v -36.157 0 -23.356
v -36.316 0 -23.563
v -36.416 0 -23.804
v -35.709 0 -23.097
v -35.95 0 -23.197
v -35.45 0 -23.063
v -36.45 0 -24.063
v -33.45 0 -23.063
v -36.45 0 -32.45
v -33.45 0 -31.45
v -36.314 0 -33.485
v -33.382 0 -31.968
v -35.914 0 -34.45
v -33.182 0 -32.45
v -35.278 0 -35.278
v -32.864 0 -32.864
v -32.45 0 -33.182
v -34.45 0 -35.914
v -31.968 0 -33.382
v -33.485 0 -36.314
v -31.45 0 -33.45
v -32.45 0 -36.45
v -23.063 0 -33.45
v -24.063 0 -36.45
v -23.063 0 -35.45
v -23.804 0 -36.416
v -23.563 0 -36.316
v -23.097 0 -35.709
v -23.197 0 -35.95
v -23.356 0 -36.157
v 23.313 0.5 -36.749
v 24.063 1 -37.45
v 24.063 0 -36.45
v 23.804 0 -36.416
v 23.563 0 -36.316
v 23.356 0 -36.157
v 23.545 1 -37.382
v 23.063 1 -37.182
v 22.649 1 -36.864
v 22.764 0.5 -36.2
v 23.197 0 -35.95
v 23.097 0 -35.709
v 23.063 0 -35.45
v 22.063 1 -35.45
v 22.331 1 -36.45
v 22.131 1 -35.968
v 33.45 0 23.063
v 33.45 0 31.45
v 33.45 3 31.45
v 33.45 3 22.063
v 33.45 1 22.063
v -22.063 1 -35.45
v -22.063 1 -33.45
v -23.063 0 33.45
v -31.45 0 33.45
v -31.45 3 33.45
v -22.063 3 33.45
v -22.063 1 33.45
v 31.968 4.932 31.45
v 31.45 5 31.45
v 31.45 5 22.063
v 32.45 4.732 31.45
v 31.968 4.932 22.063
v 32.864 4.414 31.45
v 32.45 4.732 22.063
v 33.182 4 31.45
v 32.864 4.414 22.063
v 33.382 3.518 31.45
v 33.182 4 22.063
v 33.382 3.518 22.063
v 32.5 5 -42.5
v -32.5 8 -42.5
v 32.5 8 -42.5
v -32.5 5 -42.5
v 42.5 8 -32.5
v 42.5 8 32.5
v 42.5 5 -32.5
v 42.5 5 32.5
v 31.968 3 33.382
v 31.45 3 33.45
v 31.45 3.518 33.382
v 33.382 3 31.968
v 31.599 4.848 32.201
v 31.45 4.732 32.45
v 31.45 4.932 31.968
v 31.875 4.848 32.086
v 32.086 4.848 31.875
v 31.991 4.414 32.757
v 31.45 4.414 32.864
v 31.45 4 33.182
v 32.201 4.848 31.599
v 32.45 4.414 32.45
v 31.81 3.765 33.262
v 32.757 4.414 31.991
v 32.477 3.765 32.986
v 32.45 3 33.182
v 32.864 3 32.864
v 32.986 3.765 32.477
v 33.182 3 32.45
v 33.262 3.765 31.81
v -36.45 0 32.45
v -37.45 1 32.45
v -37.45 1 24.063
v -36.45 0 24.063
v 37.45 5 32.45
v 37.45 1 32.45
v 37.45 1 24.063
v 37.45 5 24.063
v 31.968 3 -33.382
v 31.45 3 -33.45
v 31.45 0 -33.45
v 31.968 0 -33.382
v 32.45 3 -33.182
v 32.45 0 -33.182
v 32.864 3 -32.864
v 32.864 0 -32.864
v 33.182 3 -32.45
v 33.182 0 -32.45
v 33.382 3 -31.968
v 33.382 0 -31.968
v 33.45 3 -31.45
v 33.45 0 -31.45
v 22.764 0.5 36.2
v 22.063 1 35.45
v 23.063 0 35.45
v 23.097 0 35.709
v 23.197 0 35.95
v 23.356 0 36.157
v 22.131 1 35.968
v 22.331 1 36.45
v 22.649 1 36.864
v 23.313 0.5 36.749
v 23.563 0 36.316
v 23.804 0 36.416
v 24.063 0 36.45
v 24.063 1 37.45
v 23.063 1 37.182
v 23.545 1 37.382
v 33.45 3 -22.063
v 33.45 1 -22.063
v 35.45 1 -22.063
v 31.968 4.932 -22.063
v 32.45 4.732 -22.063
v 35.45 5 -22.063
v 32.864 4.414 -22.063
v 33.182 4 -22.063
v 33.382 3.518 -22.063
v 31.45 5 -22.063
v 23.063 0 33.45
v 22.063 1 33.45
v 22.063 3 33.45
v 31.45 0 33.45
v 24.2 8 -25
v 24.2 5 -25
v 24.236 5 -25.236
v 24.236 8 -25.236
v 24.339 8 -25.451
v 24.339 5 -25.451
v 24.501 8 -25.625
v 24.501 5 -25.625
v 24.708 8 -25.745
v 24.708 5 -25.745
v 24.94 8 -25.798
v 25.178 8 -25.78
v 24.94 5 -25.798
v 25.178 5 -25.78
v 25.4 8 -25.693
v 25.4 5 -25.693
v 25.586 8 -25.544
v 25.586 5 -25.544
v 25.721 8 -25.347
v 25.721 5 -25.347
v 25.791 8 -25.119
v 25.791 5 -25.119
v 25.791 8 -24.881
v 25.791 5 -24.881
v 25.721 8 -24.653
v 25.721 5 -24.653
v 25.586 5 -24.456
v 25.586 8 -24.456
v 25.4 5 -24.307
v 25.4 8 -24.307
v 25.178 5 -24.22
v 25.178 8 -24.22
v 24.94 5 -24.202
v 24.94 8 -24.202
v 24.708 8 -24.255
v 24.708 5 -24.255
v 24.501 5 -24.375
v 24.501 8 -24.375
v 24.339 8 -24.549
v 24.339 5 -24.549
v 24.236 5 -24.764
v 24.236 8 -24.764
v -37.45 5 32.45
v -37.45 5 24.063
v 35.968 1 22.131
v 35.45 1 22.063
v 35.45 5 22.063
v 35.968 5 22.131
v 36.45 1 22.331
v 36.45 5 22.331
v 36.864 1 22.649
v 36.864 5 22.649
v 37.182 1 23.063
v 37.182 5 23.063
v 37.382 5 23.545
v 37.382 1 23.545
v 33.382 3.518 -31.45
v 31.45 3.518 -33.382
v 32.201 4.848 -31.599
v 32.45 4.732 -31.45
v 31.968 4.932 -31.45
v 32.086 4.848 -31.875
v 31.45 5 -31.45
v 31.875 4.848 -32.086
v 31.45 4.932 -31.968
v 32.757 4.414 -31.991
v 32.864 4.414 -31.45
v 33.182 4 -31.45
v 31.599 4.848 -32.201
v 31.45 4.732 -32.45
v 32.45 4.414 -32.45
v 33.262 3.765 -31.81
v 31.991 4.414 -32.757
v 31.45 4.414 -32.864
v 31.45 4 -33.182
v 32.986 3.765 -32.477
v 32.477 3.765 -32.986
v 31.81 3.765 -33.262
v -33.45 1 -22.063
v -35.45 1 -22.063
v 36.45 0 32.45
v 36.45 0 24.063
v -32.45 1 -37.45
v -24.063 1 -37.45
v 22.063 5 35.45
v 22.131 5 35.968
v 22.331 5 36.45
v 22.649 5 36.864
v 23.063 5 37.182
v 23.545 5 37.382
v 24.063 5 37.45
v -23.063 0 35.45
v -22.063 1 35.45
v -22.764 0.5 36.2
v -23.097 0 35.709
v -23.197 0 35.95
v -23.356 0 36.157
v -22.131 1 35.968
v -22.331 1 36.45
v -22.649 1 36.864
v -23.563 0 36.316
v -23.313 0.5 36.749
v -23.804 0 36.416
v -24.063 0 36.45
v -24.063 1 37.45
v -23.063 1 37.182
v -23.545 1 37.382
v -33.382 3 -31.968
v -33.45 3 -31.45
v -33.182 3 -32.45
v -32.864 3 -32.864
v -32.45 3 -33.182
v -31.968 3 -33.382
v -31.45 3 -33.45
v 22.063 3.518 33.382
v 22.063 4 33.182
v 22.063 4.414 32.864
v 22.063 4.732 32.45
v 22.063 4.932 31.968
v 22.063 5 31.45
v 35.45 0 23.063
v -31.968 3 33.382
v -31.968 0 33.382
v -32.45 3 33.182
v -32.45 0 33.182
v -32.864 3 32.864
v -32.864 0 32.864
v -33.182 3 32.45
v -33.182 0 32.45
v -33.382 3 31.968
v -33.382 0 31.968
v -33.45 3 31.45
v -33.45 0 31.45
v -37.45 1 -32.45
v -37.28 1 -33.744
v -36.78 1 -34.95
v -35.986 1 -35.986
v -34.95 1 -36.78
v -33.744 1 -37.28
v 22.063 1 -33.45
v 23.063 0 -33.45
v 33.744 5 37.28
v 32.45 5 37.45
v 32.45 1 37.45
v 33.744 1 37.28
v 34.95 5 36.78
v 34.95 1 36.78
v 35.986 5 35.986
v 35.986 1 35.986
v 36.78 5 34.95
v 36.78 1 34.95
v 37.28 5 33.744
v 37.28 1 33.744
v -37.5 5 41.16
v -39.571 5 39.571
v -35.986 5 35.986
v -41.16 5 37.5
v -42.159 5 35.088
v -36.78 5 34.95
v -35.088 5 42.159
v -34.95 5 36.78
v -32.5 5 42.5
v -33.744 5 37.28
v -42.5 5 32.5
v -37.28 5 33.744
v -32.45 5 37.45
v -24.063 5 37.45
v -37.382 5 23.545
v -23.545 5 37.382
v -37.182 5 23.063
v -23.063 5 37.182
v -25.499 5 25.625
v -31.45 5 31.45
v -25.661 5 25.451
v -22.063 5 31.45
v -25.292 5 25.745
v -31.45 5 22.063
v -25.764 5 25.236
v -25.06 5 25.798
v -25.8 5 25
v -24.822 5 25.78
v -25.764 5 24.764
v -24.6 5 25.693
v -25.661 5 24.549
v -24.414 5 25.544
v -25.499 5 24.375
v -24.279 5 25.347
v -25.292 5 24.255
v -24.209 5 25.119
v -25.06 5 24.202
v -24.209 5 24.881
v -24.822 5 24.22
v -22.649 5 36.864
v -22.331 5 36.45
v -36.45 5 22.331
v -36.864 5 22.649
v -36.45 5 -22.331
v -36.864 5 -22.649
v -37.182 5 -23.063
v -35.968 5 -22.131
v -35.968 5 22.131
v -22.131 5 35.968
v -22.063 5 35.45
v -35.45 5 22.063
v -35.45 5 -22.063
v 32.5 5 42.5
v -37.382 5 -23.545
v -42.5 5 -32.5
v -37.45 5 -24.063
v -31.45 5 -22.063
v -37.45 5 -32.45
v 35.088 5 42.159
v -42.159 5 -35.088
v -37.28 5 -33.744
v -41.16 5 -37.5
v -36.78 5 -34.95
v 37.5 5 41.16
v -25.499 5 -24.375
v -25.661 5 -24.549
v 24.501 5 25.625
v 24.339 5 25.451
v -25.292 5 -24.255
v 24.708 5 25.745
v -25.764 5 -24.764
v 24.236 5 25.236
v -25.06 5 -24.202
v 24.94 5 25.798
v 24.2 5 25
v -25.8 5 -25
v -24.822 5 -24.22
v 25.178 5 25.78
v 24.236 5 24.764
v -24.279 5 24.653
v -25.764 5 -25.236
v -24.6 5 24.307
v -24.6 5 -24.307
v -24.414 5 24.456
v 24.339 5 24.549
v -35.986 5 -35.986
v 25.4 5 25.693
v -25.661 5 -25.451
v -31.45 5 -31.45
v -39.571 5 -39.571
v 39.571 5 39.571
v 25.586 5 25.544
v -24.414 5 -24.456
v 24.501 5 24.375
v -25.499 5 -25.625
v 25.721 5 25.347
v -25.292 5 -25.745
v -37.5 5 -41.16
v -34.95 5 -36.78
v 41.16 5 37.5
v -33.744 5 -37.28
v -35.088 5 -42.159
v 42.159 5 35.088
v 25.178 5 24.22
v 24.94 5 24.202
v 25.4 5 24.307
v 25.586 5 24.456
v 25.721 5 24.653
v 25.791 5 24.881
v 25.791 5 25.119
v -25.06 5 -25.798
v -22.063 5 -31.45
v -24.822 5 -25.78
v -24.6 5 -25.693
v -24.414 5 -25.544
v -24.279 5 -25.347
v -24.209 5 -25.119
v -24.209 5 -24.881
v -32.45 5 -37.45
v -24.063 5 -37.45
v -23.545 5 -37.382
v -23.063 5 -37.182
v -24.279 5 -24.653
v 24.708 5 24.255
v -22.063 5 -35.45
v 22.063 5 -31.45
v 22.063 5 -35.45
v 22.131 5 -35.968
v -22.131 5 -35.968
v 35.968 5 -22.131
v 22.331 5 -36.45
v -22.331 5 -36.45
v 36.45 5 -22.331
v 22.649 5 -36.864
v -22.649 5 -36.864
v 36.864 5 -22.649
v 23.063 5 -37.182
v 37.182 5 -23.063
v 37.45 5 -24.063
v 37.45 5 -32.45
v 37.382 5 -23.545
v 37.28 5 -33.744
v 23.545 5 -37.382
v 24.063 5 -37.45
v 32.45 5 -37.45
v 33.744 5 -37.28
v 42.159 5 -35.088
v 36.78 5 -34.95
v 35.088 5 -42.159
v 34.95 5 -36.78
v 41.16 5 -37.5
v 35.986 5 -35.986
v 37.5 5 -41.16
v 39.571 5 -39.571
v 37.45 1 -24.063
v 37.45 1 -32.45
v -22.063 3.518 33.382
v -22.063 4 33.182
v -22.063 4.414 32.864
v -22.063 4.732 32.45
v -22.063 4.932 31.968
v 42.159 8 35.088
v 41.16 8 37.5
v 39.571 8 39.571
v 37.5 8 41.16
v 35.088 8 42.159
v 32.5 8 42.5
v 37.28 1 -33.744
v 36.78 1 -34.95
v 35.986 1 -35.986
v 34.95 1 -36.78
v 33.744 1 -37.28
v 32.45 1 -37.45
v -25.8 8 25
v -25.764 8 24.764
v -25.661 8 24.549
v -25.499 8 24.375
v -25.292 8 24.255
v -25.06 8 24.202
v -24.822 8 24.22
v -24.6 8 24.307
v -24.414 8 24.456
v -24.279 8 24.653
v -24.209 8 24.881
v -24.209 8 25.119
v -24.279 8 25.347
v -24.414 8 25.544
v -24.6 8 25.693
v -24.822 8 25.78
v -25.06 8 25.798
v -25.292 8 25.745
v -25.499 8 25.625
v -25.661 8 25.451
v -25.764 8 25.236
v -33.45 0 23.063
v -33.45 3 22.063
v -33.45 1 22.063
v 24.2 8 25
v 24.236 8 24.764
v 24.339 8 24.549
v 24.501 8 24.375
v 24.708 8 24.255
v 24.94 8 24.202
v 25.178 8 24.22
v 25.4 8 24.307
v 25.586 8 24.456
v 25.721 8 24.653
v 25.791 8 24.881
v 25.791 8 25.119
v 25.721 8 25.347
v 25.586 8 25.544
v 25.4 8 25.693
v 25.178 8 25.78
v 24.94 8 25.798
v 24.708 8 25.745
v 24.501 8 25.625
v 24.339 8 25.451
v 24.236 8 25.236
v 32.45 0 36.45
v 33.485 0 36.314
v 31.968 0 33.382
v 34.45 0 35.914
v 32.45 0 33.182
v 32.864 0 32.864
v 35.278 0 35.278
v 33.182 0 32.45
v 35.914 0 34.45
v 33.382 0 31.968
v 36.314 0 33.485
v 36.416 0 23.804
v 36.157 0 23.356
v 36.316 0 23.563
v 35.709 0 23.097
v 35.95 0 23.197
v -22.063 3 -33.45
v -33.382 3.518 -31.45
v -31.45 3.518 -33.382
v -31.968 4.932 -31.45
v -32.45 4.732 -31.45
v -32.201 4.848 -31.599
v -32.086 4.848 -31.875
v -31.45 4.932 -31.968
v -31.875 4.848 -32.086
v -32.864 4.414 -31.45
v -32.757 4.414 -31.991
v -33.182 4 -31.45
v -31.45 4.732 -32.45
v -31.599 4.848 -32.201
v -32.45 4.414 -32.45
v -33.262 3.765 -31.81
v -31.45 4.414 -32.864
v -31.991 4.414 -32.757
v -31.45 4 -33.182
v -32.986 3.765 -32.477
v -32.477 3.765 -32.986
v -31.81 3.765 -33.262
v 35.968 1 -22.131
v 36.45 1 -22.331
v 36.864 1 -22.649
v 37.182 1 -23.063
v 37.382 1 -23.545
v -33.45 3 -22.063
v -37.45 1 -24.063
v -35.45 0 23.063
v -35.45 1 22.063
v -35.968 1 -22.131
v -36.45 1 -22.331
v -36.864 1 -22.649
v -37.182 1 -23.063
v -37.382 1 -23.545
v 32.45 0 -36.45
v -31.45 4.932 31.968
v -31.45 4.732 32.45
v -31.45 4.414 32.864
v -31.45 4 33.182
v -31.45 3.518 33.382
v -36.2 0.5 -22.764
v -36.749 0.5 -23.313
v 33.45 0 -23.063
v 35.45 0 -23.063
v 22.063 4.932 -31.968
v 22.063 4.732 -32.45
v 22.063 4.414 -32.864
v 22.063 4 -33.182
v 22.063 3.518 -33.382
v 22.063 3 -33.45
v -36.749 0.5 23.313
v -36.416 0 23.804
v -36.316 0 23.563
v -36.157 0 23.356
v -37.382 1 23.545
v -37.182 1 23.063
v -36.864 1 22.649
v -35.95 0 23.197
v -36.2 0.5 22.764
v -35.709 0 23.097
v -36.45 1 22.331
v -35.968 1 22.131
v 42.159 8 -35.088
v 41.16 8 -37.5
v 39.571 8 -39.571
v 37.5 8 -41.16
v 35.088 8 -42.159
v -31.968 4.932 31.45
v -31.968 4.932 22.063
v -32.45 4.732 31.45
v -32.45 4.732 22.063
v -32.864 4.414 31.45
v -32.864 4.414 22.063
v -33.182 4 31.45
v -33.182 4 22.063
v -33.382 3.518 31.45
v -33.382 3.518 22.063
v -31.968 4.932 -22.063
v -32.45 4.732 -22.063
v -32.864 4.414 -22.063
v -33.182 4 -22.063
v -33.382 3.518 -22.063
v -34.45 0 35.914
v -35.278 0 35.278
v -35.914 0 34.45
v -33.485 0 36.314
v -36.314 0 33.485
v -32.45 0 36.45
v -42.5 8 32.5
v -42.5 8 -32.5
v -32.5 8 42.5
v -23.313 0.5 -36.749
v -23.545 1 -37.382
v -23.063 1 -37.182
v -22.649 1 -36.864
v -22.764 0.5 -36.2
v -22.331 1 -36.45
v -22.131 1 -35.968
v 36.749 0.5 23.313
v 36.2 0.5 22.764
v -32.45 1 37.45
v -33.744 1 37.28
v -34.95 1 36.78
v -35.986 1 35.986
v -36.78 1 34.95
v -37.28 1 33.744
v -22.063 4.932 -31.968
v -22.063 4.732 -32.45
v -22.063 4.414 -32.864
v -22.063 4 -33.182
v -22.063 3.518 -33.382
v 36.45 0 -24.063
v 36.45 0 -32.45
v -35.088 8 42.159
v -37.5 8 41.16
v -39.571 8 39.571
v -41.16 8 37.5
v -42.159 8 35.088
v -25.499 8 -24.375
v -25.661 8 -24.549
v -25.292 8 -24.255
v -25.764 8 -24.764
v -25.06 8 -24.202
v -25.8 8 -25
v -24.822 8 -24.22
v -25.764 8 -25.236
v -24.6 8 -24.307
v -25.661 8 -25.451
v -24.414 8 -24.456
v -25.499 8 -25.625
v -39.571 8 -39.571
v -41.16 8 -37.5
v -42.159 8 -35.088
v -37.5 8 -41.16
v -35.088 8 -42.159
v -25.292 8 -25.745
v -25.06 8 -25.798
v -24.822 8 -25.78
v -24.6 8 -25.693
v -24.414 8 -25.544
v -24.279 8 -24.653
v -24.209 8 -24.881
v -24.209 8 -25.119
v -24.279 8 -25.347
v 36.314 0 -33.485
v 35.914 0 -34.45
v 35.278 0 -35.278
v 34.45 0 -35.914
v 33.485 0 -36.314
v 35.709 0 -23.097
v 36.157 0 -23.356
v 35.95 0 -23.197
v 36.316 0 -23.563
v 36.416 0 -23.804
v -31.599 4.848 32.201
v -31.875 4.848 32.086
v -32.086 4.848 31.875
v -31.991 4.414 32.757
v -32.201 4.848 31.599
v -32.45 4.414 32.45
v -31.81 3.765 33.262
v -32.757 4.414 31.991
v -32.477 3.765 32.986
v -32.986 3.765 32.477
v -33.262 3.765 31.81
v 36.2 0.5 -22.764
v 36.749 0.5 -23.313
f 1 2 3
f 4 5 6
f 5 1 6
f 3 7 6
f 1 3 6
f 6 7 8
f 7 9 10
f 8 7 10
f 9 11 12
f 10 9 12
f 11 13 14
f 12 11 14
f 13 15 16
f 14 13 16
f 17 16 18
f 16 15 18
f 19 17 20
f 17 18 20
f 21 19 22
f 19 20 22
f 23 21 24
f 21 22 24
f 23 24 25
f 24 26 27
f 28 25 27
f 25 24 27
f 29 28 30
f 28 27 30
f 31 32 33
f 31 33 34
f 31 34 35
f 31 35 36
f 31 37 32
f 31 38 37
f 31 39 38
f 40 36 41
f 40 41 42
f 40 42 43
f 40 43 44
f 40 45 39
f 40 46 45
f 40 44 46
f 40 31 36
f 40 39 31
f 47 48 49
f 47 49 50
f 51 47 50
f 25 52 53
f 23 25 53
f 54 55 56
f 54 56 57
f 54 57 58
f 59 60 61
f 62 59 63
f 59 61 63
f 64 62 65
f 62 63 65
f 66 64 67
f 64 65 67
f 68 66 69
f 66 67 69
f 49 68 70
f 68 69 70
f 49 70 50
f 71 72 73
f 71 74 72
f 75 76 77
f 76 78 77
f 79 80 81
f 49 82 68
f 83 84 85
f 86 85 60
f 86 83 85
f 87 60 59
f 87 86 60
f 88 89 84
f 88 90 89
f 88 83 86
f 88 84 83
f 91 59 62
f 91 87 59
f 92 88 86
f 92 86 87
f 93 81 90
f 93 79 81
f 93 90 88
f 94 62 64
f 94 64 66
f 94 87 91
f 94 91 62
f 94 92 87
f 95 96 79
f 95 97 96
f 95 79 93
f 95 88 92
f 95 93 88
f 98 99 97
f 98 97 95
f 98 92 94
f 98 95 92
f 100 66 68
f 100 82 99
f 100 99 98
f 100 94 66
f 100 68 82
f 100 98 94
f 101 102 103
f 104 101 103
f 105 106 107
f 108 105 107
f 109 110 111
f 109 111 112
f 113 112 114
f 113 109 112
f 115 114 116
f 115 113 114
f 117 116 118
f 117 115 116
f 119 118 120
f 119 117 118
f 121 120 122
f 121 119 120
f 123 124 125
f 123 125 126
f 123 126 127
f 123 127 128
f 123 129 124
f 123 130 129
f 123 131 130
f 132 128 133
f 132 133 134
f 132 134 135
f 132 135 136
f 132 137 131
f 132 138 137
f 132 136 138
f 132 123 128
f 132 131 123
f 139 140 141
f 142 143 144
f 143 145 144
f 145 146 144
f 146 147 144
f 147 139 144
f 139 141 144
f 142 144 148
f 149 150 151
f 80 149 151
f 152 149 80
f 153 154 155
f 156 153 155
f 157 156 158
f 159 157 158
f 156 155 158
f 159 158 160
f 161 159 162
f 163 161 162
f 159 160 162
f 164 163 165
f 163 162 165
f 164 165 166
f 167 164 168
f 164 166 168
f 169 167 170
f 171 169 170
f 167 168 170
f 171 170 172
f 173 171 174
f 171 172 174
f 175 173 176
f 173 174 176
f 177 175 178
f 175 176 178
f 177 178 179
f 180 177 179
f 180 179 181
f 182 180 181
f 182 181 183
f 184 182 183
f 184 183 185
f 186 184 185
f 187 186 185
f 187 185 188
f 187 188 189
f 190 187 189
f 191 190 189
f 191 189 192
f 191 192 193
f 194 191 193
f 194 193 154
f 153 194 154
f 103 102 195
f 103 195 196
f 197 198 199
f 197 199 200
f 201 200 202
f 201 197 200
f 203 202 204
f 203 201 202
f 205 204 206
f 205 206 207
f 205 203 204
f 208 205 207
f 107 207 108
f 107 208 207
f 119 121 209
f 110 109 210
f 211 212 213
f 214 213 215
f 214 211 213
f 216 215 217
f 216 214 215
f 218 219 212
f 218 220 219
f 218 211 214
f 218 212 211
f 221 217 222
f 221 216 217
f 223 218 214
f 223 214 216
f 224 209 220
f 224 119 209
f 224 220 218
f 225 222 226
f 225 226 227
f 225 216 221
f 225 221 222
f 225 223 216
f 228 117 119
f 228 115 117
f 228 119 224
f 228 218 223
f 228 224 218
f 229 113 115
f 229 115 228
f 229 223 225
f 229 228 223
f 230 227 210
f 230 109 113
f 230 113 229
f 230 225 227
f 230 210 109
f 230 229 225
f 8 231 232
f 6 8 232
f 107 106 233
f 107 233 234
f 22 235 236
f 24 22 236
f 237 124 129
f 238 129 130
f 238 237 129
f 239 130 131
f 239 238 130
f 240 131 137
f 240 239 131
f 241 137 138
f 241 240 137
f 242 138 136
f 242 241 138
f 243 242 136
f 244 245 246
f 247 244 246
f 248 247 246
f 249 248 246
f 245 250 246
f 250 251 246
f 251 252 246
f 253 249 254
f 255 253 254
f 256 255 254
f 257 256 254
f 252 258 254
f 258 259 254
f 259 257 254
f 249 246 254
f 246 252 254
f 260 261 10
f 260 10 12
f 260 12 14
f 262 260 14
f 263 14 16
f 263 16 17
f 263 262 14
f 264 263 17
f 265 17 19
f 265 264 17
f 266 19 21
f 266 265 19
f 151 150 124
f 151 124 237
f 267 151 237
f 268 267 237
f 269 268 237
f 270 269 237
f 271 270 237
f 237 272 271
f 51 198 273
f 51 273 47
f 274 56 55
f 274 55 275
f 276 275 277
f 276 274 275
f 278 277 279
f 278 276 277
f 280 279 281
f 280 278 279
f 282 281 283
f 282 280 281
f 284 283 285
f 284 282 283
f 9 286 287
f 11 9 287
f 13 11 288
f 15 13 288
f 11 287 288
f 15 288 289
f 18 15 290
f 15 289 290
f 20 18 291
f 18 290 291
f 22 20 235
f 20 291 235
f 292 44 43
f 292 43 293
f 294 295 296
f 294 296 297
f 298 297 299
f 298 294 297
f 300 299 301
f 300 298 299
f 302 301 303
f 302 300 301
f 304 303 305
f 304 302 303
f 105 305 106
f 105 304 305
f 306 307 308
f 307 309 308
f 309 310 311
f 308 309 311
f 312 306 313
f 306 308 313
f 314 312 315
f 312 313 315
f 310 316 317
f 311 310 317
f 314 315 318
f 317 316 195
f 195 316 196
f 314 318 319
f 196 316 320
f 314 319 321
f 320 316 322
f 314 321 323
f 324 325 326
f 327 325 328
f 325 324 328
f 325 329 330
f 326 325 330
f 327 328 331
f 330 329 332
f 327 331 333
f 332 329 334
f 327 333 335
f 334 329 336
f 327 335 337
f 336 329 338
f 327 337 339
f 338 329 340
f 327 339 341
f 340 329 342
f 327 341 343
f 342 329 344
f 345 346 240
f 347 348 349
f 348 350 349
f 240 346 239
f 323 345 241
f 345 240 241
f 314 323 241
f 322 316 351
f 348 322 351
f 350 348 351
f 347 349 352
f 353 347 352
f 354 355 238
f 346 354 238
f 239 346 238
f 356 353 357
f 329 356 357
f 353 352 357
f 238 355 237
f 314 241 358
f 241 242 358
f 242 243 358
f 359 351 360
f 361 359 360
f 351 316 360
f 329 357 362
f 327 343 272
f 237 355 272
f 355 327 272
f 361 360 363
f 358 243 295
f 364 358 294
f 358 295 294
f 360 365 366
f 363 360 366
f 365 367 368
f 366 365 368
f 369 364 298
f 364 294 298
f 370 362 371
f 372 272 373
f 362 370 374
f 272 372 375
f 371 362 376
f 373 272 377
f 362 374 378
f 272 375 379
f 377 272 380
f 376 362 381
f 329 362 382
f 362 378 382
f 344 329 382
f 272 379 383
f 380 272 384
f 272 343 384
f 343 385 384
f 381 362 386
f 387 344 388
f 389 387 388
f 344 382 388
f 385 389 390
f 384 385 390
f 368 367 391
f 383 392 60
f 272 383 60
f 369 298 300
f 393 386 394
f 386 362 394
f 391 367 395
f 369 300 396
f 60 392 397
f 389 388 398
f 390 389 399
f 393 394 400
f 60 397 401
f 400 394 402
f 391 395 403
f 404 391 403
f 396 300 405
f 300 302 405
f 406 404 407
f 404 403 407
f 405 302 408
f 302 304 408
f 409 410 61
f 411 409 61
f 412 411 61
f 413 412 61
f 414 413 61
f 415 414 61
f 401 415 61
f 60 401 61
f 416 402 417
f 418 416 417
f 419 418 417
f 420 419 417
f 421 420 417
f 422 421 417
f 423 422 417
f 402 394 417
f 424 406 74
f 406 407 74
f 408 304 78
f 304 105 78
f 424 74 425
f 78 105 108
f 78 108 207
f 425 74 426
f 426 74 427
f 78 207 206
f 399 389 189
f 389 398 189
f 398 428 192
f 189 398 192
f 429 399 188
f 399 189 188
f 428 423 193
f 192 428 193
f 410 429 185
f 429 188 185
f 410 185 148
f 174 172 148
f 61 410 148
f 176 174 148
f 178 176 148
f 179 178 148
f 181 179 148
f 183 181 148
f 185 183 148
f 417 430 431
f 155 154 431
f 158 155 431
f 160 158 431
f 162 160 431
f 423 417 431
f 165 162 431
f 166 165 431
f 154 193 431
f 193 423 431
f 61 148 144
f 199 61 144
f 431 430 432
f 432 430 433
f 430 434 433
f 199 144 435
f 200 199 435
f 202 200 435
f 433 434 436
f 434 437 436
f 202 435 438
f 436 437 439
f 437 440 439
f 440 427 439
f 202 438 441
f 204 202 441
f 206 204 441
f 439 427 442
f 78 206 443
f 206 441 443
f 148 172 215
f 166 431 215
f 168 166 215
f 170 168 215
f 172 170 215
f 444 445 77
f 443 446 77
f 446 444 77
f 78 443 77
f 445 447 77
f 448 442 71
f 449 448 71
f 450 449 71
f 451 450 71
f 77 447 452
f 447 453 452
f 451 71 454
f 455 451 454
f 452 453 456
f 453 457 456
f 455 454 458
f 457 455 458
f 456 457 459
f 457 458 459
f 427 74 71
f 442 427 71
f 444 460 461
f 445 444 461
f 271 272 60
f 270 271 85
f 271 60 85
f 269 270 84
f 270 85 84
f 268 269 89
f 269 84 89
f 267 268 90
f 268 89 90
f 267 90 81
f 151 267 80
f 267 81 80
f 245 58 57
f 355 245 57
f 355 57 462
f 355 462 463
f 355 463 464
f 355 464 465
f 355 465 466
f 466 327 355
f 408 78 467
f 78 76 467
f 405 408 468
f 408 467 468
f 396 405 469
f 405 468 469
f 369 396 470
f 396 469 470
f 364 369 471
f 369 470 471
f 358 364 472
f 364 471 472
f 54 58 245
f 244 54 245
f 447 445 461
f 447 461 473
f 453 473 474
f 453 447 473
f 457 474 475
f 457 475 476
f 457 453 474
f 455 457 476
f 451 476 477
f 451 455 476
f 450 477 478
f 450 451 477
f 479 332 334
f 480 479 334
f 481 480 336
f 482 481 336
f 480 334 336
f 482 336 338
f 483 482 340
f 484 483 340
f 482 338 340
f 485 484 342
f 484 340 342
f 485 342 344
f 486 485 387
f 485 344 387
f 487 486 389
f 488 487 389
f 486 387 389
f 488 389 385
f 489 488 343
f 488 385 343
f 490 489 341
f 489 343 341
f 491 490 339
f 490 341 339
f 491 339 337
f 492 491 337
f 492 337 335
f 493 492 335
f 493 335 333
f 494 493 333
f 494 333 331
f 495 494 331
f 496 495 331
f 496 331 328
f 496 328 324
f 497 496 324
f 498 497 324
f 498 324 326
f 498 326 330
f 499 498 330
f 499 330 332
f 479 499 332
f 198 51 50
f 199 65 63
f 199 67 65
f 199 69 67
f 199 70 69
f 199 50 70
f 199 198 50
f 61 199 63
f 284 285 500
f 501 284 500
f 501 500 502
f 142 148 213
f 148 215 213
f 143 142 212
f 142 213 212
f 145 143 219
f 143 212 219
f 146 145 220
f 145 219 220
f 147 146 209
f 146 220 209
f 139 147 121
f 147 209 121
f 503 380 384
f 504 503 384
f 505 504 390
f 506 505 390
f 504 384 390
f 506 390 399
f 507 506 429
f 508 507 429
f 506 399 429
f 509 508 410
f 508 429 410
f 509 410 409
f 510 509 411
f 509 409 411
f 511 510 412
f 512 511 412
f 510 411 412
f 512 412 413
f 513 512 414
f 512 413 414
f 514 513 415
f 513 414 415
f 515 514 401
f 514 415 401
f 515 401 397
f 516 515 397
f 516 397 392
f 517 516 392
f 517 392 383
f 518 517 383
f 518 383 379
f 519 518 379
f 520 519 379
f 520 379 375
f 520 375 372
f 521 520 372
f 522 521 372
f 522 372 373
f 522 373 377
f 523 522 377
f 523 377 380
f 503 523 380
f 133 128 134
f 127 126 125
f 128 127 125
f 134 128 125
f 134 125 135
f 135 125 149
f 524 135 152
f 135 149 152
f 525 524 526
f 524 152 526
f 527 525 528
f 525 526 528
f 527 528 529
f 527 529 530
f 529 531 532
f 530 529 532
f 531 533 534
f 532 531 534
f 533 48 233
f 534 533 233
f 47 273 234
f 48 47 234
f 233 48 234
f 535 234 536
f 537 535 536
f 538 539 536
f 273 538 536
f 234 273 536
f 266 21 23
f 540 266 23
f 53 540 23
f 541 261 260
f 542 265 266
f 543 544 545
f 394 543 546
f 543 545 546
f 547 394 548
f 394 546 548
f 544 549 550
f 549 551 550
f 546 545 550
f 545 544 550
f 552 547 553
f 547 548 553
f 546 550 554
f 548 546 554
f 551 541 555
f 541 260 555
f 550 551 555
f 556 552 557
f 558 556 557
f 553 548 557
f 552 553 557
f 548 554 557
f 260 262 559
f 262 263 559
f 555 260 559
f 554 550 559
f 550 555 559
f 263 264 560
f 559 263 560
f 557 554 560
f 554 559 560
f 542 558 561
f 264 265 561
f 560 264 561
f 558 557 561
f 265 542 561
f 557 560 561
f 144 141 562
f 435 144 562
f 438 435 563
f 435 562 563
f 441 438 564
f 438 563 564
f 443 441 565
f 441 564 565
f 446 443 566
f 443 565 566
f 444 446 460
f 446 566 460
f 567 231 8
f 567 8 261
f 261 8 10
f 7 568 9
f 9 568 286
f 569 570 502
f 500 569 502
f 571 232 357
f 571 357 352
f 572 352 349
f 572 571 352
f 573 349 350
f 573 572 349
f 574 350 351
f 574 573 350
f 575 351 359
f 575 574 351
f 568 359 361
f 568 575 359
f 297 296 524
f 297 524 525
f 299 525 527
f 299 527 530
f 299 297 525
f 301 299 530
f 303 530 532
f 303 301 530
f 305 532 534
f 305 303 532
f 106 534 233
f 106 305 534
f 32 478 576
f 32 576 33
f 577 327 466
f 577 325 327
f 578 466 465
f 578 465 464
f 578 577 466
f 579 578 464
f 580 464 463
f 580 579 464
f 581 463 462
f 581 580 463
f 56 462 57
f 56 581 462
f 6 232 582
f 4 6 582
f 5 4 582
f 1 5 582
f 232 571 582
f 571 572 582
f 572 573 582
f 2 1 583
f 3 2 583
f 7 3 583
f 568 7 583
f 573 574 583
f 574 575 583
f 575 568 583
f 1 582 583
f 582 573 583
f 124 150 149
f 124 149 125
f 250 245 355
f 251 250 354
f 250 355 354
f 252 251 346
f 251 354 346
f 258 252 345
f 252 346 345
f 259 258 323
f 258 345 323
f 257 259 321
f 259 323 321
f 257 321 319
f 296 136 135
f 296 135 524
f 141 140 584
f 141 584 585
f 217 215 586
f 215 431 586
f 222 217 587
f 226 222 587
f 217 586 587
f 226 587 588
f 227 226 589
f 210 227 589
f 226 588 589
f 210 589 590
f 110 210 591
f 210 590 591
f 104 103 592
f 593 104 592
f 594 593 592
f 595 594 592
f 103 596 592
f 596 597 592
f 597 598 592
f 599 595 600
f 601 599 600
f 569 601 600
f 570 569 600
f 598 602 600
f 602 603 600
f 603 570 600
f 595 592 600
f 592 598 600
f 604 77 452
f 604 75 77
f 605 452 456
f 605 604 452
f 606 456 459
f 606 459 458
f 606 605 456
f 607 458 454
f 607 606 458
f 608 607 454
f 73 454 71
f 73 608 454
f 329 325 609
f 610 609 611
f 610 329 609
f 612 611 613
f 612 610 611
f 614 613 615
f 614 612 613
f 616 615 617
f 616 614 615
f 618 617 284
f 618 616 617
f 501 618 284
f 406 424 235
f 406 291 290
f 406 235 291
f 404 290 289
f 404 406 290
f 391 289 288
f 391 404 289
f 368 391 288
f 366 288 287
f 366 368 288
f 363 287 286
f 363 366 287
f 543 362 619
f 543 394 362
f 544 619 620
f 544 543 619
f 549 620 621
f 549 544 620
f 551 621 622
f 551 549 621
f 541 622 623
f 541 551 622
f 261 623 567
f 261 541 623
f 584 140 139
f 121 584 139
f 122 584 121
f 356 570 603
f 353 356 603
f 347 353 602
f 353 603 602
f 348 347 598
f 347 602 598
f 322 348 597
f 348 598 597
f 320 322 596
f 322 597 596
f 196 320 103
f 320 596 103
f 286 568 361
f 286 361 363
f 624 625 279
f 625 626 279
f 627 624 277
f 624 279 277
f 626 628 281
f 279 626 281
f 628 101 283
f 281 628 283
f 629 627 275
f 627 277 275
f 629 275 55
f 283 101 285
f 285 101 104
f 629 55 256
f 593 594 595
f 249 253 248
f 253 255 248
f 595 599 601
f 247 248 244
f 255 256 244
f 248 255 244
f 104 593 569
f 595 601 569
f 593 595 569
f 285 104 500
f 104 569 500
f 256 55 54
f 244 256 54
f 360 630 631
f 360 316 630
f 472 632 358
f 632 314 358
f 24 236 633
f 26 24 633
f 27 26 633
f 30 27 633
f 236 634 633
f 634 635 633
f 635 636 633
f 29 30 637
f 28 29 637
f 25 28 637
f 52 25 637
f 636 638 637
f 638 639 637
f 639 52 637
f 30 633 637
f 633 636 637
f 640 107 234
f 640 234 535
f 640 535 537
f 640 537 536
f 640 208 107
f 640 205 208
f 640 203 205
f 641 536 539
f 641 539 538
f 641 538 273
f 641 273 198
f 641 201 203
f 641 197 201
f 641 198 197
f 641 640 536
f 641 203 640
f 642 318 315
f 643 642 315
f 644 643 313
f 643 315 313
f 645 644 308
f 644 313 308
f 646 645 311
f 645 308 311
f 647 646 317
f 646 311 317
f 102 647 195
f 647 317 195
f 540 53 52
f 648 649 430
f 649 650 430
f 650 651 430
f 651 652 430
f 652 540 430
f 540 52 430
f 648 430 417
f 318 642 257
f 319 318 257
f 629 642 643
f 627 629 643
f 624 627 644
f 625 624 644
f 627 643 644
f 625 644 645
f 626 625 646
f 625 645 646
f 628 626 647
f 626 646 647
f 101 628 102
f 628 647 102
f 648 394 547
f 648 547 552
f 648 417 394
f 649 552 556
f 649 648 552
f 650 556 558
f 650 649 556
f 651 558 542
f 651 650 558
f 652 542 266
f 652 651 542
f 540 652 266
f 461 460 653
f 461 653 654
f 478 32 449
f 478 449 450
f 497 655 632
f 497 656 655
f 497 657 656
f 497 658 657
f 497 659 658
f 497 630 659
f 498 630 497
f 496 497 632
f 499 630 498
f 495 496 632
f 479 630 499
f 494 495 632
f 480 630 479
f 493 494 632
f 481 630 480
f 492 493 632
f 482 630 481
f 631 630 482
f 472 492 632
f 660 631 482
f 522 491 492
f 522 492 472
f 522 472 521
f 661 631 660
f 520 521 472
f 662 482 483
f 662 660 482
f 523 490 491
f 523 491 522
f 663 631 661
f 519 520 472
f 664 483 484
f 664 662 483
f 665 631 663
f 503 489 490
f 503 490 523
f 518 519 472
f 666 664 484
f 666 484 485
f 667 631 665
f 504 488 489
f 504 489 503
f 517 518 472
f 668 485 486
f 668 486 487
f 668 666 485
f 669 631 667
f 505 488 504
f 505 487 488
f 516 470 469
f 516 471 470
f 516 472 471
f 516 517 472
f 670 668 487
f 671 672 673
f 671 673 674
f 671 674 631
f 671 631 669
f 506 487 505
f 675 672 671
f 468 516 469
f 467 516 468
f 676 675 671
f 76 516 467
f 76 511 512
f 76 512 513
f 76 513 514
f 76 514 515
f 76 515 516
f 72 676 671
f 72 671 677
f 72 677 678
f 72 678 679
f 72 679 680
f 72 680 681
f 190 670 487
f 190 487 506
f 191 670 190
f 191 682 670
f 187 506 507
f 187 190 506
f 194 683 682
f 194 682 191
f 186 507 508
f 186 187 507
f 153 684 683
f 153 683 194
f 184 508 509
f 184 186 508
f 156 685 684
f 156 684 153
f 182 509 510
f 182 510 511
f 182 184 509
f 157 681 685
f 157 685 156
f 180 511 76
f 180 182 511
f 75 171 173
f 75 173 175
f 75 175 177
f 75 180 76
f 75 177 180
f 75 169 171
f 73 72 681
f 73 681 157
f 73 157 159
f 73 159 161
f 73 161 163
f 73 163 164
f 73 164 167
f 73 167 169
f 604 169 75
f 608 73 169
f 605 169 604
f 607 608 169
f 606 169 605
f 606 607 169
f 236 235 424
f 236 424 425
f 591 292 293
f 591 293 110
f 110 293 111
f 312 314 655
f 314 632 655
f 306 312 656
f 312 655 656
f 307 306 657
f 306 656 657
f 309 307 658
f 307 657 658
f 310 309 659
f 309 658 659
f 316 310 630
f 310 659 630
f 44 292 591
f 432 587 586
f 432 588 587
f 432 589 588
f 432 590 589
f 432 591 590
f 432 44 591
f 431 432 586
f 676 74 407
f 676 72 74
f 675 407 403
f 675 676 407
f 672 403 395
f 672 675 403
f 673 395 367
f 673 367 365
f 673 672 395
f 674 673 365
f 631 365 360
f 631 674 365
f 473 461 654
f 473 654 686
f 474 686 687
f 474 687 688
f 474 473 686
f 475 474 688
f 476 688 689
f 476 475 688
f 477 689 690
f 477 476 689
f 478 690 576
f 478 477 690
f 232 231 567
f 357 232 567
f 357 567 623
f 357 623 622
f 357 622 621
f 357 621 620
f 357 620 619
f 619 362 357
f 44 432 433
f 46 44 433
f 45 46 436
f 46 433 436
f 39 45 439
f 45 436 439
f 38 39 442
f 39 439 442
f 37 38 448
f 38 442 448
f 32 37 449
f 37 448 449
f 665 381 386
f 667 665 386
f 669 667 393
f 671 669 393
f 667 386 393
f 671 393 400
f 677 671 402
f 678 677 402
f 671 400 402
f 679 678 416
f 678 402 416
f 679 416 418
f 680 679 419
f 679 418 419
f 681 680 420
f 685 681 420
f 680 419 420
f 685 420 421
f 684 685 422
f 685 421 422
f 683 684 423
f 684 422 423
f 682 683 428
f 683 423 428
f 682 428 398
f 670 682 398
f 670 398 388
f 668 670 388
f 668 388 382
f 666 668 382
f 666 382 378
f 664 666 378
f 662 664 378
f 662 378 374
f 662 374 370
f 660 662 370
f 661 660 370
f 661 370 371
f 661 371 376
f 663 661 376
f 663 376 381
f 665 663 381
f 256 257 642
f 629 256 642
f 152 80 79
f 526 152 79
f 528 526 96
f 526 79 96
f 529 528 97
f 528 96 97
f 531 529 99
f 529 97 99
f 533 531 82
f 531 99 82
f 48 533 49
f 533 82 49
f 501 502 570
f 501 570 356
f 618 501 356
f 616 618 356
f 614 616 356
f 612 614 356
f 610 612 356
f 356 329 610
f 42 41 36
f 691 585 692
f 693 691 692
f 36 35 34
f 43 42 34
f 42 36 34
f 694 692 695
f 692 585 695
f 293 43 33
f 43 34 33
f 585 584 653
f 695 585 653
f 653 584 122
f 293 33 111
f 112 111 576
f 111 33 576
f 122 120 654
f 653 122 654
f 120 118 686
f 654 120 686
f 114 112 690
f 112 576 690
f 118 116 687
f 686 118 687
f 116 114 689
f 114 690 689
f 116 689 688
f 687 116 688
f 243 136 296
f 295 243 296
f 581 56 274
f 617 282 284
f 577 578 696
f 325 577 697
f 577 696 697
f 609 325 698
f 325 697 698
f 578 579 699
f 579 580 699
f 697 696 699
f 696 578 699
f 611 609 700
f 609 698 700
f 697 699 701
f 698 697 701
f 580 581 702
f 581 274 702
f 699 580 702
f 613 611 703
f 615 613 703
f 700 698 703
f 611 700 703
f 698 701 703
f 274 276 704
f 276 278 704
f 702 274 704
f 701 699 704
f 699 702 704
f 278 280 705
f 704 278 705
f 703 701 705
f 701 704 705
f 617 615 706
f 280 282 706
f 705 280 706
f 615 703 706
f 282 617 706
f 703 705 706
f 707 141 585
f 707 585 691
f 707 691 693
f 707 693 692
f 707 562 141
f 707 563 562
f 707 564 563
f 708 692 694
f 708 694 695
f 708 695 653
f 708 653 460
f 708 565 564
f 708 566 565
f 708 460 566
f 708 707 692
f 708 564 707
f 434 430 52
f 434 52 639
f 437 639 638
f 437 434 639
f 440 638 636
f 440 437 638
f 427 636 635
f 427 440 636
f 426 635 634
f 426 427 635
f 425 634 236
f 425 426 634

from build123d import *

# Parameters (mm, degrees)
SKETCH_1_W               = 74.9
SKETCH_1_H               = 74.9
SKETCH_1_W_2             = 66.9
SKETCH_1_H_2             = 66.9
EXTRUDE_1_DEPTH          = 5
SKETCH_2_W               = 85
SKETCH_2_H               = 85
EXTRUDE_2_DEPTH          = 3
FILLET_2_R               = 5
SKETCH_3_W               = 44.125802366
SKETCH_3_H               = 10
CUT_EXTRUDE_1_DEPTH      = 103
PATTERN_CIRCULAR_1_COUNT = 2
PATTERN_CIRCULAR_1_ANGLE = 90
FILLET_3_R               = 2
FILLET_4_R               = 2
FILLET_5_R               = 2
CHAMFER_1_SIZE           = 1
SKETCH_5_R               = 0.8
CUT_EXTRUDE_2_DEPTH      = 10
FILLET_9_R               = 10


with BuildPart() as part:
    # 草图1 → 凸台-拉伸1 (new body)
    with BuildSketch(Plane(origin=(0, 0, 0), x_dir=(1, 0, 0), z_dir=(0, 1, 0))):
        Rectangle(SKETCH_1_W, SKETCH_1_H)
        Rectangle(SKETCH_1_W_2, SKETCH_1_H_2, mode=Mode.SUBTRACT)
    extrude(amount=EXTRUDE_1_DEPTH)

    # 草图2 → 凸台-拉伸2 (add)
    with BuildSketch(Plane(origin=(0, 5, 0), x_dir=(1, 0, 0), z_dir=(0, 1, 0))):
        Rectangle(SKETCH_2_W, SKETCH_2_H)
    extrude(amount=EXTRUDE_2_DEPTH)

    # 圆角2
    fillet_2_edges = [part.edges().sort_by_distance(p)[0] for p in [
        (-37.45, 2.5, 37.45),
        (-37.45, 2.5, -37.45),
        (37.45, 2.5, -37.45),
        (37.45, 2.5, 37.45),
    ]]
    fillet(fillet_2_edges, radius=FILLET_2_R)

    # 草图3 → 切除-拉伸1 (cut, symmetric)
    with BuildSketch(Plane(origin=(0, 0, -37.45), x_dir=(-1, 0, 0), z_dir=(0, 0, -1))):
        Rectangle(SKETCH_3_W, SKETCH_3_H)
    cut_extrude_1 = extrude(amount=CUT_EXTRUDE_1_DEPTH, both=True, mode=Mode.SUBTRACT)

    # 阵列(圆周)1: 切除-拉伸1 ×2 about axis
    pattern_circular_1_axis = Axis((0, 0, 0), (0, -1, 0))
    for i in range(1, PATTERN_CIRCULAR_1_COUNT):
        add(cut_extrude_1.rotate(pattern_circular_1_axis, i * PATTERN_CIRCULAR_1_ANGLE / (PATTERN_CIRCULAR_1_COUNT - 1)), mode=Mode.SUBTRACT)

    # 圆角3
    fillet_3_edges = [part.edges().sort_by_distance(p)[0] for p in [
        (-33.45, 2.5, 33.45),
        (33.45, 2.5, 33.45),
        (33.45, 2.5, -33.45),
        (-33.45, 2.5, -33.45),
    ]]
    fillet(fillet_3_edges, radius=FILLET_3_R)

    # 圆角4
    fillet_4_edges = [part.edges().sort_by_distance(p)[0] for p in [
        (-22.062901183, 2.5, -37.45),
        (-37.45, 2.5, -22.062901183),
        (37.45, 2.5, -22.062901183),
        (22.062901183, 2.5, -37.45),
        (-37.45, 2.5, 22.062901183),
        (-22.062901183, 2.5, 37.45),
        (37.45, 2.5, 22.062901183),
        (22.062901183, 2.5, 37.45),
    ]]
    fillet(fillet_4_edges, radius=FILLET_4_R)

    # 圆角5
    fillet_5_edges = [part.edges().sort_by_distance(p)[0] for p in [
        (-26.756450591, 5, 33.45),
        (-32.864213562, 5, 32.864213562),
        (33.45, 5, 26.756450591),
        (26.756450591, 5, 33.45),
        (-33.45, 5, -26.756450591),
        (-32.864213562, 5, -32.864213562),
        (33.45, 5, -26.756450591),
        (32.864213562, 5, -32.864213562),
        (-33.45, 5, 26.756450591),
        (32.864213562, 5, 32.864213562),
        (-26.756450591, 5, -33.45),
        (26.756450591, 5, -33.45),
    ]]
    fillet(fillet_5_edges, radius=FILLET_5_R)

    # 倒角1
    chamfer_1_edges = [part.edges().sort_by_distance(p)[0] for p in [
        (-22.062901183, 0, 34.45),
        (-22.64868762, 0, 36.864213562),
        (-28.256450591, 0, 37.45),
        (-35.985533906, 0, 35.985533906),
        (-37.45, 0, 28.256450591),
        (-36.864213562, 0, 22.64868762),
        (-36.864213562, 0, -22.64868762),
        (-22.062901183, 0, -34.45),
        (-37.45, 0, -28.256450591),
        (-22.64868762, 0, -36.864213562),
        (-35.985533906, 0, -35.985533906),
        (-28.256450591, 0, -37.45),
        (36.864213562, 0, -22.64868762),
        (37.45, 0, -28.256450591),
        (35.985533906, 0, -35.985533906),
        (22.062901183, 0, -34.45),
        (28.256450591, 0, -37.45),
        (22.64868762, 0, -36.864213562),
        (36.864213562, 0, 22.64868762),
        (37.45, 0, 28.256450591),
        (35.985533906, 0, 35.985533906),
        (28.256450591, 0, 37.45),
        (22.062901183, 0, 34.45),
        (22.64868762, 0, 36.864213562),
    ]]
    chamfer(chamfer_1_edges, length=CHAMFER_1_SIZE)

    # 草图5 → 切除-拉伸2 (cut)
    with BuildSketch(Plane(origin=(0, 5, 0), x_dir=(-1, 0, 0), z_dir=(0, -1, 0))):
        with Locations((-25, 25)):
            Circle(SKETCH_5_R)
        with Locations((25, 25)):
            Circle(SKETCH_5_R)
        with Locations((25, -25)):
            Circle(SKETCH_5_R)
        with Locations((-25, -25)):
            Circle(SKETCH_5_R)
    extrude(amount=-CUT_EXTRUDE_2_DEPTH, mode=Mode.SUBTRACT)

    # 圆角9
    fillet_9_edges = [part.edges().sort_by_distance(p)[0] for p in [
        (42.5, 6.5, -42.5),
        (-42.5, 6.5, -42.5),
        (42.5, 6.5, 42.5),
        (-42.5, 6.5, 42.5),
    ]]
    fillet(fillet_9_edges, radius=FILLET_9_R)


solid = part.part
